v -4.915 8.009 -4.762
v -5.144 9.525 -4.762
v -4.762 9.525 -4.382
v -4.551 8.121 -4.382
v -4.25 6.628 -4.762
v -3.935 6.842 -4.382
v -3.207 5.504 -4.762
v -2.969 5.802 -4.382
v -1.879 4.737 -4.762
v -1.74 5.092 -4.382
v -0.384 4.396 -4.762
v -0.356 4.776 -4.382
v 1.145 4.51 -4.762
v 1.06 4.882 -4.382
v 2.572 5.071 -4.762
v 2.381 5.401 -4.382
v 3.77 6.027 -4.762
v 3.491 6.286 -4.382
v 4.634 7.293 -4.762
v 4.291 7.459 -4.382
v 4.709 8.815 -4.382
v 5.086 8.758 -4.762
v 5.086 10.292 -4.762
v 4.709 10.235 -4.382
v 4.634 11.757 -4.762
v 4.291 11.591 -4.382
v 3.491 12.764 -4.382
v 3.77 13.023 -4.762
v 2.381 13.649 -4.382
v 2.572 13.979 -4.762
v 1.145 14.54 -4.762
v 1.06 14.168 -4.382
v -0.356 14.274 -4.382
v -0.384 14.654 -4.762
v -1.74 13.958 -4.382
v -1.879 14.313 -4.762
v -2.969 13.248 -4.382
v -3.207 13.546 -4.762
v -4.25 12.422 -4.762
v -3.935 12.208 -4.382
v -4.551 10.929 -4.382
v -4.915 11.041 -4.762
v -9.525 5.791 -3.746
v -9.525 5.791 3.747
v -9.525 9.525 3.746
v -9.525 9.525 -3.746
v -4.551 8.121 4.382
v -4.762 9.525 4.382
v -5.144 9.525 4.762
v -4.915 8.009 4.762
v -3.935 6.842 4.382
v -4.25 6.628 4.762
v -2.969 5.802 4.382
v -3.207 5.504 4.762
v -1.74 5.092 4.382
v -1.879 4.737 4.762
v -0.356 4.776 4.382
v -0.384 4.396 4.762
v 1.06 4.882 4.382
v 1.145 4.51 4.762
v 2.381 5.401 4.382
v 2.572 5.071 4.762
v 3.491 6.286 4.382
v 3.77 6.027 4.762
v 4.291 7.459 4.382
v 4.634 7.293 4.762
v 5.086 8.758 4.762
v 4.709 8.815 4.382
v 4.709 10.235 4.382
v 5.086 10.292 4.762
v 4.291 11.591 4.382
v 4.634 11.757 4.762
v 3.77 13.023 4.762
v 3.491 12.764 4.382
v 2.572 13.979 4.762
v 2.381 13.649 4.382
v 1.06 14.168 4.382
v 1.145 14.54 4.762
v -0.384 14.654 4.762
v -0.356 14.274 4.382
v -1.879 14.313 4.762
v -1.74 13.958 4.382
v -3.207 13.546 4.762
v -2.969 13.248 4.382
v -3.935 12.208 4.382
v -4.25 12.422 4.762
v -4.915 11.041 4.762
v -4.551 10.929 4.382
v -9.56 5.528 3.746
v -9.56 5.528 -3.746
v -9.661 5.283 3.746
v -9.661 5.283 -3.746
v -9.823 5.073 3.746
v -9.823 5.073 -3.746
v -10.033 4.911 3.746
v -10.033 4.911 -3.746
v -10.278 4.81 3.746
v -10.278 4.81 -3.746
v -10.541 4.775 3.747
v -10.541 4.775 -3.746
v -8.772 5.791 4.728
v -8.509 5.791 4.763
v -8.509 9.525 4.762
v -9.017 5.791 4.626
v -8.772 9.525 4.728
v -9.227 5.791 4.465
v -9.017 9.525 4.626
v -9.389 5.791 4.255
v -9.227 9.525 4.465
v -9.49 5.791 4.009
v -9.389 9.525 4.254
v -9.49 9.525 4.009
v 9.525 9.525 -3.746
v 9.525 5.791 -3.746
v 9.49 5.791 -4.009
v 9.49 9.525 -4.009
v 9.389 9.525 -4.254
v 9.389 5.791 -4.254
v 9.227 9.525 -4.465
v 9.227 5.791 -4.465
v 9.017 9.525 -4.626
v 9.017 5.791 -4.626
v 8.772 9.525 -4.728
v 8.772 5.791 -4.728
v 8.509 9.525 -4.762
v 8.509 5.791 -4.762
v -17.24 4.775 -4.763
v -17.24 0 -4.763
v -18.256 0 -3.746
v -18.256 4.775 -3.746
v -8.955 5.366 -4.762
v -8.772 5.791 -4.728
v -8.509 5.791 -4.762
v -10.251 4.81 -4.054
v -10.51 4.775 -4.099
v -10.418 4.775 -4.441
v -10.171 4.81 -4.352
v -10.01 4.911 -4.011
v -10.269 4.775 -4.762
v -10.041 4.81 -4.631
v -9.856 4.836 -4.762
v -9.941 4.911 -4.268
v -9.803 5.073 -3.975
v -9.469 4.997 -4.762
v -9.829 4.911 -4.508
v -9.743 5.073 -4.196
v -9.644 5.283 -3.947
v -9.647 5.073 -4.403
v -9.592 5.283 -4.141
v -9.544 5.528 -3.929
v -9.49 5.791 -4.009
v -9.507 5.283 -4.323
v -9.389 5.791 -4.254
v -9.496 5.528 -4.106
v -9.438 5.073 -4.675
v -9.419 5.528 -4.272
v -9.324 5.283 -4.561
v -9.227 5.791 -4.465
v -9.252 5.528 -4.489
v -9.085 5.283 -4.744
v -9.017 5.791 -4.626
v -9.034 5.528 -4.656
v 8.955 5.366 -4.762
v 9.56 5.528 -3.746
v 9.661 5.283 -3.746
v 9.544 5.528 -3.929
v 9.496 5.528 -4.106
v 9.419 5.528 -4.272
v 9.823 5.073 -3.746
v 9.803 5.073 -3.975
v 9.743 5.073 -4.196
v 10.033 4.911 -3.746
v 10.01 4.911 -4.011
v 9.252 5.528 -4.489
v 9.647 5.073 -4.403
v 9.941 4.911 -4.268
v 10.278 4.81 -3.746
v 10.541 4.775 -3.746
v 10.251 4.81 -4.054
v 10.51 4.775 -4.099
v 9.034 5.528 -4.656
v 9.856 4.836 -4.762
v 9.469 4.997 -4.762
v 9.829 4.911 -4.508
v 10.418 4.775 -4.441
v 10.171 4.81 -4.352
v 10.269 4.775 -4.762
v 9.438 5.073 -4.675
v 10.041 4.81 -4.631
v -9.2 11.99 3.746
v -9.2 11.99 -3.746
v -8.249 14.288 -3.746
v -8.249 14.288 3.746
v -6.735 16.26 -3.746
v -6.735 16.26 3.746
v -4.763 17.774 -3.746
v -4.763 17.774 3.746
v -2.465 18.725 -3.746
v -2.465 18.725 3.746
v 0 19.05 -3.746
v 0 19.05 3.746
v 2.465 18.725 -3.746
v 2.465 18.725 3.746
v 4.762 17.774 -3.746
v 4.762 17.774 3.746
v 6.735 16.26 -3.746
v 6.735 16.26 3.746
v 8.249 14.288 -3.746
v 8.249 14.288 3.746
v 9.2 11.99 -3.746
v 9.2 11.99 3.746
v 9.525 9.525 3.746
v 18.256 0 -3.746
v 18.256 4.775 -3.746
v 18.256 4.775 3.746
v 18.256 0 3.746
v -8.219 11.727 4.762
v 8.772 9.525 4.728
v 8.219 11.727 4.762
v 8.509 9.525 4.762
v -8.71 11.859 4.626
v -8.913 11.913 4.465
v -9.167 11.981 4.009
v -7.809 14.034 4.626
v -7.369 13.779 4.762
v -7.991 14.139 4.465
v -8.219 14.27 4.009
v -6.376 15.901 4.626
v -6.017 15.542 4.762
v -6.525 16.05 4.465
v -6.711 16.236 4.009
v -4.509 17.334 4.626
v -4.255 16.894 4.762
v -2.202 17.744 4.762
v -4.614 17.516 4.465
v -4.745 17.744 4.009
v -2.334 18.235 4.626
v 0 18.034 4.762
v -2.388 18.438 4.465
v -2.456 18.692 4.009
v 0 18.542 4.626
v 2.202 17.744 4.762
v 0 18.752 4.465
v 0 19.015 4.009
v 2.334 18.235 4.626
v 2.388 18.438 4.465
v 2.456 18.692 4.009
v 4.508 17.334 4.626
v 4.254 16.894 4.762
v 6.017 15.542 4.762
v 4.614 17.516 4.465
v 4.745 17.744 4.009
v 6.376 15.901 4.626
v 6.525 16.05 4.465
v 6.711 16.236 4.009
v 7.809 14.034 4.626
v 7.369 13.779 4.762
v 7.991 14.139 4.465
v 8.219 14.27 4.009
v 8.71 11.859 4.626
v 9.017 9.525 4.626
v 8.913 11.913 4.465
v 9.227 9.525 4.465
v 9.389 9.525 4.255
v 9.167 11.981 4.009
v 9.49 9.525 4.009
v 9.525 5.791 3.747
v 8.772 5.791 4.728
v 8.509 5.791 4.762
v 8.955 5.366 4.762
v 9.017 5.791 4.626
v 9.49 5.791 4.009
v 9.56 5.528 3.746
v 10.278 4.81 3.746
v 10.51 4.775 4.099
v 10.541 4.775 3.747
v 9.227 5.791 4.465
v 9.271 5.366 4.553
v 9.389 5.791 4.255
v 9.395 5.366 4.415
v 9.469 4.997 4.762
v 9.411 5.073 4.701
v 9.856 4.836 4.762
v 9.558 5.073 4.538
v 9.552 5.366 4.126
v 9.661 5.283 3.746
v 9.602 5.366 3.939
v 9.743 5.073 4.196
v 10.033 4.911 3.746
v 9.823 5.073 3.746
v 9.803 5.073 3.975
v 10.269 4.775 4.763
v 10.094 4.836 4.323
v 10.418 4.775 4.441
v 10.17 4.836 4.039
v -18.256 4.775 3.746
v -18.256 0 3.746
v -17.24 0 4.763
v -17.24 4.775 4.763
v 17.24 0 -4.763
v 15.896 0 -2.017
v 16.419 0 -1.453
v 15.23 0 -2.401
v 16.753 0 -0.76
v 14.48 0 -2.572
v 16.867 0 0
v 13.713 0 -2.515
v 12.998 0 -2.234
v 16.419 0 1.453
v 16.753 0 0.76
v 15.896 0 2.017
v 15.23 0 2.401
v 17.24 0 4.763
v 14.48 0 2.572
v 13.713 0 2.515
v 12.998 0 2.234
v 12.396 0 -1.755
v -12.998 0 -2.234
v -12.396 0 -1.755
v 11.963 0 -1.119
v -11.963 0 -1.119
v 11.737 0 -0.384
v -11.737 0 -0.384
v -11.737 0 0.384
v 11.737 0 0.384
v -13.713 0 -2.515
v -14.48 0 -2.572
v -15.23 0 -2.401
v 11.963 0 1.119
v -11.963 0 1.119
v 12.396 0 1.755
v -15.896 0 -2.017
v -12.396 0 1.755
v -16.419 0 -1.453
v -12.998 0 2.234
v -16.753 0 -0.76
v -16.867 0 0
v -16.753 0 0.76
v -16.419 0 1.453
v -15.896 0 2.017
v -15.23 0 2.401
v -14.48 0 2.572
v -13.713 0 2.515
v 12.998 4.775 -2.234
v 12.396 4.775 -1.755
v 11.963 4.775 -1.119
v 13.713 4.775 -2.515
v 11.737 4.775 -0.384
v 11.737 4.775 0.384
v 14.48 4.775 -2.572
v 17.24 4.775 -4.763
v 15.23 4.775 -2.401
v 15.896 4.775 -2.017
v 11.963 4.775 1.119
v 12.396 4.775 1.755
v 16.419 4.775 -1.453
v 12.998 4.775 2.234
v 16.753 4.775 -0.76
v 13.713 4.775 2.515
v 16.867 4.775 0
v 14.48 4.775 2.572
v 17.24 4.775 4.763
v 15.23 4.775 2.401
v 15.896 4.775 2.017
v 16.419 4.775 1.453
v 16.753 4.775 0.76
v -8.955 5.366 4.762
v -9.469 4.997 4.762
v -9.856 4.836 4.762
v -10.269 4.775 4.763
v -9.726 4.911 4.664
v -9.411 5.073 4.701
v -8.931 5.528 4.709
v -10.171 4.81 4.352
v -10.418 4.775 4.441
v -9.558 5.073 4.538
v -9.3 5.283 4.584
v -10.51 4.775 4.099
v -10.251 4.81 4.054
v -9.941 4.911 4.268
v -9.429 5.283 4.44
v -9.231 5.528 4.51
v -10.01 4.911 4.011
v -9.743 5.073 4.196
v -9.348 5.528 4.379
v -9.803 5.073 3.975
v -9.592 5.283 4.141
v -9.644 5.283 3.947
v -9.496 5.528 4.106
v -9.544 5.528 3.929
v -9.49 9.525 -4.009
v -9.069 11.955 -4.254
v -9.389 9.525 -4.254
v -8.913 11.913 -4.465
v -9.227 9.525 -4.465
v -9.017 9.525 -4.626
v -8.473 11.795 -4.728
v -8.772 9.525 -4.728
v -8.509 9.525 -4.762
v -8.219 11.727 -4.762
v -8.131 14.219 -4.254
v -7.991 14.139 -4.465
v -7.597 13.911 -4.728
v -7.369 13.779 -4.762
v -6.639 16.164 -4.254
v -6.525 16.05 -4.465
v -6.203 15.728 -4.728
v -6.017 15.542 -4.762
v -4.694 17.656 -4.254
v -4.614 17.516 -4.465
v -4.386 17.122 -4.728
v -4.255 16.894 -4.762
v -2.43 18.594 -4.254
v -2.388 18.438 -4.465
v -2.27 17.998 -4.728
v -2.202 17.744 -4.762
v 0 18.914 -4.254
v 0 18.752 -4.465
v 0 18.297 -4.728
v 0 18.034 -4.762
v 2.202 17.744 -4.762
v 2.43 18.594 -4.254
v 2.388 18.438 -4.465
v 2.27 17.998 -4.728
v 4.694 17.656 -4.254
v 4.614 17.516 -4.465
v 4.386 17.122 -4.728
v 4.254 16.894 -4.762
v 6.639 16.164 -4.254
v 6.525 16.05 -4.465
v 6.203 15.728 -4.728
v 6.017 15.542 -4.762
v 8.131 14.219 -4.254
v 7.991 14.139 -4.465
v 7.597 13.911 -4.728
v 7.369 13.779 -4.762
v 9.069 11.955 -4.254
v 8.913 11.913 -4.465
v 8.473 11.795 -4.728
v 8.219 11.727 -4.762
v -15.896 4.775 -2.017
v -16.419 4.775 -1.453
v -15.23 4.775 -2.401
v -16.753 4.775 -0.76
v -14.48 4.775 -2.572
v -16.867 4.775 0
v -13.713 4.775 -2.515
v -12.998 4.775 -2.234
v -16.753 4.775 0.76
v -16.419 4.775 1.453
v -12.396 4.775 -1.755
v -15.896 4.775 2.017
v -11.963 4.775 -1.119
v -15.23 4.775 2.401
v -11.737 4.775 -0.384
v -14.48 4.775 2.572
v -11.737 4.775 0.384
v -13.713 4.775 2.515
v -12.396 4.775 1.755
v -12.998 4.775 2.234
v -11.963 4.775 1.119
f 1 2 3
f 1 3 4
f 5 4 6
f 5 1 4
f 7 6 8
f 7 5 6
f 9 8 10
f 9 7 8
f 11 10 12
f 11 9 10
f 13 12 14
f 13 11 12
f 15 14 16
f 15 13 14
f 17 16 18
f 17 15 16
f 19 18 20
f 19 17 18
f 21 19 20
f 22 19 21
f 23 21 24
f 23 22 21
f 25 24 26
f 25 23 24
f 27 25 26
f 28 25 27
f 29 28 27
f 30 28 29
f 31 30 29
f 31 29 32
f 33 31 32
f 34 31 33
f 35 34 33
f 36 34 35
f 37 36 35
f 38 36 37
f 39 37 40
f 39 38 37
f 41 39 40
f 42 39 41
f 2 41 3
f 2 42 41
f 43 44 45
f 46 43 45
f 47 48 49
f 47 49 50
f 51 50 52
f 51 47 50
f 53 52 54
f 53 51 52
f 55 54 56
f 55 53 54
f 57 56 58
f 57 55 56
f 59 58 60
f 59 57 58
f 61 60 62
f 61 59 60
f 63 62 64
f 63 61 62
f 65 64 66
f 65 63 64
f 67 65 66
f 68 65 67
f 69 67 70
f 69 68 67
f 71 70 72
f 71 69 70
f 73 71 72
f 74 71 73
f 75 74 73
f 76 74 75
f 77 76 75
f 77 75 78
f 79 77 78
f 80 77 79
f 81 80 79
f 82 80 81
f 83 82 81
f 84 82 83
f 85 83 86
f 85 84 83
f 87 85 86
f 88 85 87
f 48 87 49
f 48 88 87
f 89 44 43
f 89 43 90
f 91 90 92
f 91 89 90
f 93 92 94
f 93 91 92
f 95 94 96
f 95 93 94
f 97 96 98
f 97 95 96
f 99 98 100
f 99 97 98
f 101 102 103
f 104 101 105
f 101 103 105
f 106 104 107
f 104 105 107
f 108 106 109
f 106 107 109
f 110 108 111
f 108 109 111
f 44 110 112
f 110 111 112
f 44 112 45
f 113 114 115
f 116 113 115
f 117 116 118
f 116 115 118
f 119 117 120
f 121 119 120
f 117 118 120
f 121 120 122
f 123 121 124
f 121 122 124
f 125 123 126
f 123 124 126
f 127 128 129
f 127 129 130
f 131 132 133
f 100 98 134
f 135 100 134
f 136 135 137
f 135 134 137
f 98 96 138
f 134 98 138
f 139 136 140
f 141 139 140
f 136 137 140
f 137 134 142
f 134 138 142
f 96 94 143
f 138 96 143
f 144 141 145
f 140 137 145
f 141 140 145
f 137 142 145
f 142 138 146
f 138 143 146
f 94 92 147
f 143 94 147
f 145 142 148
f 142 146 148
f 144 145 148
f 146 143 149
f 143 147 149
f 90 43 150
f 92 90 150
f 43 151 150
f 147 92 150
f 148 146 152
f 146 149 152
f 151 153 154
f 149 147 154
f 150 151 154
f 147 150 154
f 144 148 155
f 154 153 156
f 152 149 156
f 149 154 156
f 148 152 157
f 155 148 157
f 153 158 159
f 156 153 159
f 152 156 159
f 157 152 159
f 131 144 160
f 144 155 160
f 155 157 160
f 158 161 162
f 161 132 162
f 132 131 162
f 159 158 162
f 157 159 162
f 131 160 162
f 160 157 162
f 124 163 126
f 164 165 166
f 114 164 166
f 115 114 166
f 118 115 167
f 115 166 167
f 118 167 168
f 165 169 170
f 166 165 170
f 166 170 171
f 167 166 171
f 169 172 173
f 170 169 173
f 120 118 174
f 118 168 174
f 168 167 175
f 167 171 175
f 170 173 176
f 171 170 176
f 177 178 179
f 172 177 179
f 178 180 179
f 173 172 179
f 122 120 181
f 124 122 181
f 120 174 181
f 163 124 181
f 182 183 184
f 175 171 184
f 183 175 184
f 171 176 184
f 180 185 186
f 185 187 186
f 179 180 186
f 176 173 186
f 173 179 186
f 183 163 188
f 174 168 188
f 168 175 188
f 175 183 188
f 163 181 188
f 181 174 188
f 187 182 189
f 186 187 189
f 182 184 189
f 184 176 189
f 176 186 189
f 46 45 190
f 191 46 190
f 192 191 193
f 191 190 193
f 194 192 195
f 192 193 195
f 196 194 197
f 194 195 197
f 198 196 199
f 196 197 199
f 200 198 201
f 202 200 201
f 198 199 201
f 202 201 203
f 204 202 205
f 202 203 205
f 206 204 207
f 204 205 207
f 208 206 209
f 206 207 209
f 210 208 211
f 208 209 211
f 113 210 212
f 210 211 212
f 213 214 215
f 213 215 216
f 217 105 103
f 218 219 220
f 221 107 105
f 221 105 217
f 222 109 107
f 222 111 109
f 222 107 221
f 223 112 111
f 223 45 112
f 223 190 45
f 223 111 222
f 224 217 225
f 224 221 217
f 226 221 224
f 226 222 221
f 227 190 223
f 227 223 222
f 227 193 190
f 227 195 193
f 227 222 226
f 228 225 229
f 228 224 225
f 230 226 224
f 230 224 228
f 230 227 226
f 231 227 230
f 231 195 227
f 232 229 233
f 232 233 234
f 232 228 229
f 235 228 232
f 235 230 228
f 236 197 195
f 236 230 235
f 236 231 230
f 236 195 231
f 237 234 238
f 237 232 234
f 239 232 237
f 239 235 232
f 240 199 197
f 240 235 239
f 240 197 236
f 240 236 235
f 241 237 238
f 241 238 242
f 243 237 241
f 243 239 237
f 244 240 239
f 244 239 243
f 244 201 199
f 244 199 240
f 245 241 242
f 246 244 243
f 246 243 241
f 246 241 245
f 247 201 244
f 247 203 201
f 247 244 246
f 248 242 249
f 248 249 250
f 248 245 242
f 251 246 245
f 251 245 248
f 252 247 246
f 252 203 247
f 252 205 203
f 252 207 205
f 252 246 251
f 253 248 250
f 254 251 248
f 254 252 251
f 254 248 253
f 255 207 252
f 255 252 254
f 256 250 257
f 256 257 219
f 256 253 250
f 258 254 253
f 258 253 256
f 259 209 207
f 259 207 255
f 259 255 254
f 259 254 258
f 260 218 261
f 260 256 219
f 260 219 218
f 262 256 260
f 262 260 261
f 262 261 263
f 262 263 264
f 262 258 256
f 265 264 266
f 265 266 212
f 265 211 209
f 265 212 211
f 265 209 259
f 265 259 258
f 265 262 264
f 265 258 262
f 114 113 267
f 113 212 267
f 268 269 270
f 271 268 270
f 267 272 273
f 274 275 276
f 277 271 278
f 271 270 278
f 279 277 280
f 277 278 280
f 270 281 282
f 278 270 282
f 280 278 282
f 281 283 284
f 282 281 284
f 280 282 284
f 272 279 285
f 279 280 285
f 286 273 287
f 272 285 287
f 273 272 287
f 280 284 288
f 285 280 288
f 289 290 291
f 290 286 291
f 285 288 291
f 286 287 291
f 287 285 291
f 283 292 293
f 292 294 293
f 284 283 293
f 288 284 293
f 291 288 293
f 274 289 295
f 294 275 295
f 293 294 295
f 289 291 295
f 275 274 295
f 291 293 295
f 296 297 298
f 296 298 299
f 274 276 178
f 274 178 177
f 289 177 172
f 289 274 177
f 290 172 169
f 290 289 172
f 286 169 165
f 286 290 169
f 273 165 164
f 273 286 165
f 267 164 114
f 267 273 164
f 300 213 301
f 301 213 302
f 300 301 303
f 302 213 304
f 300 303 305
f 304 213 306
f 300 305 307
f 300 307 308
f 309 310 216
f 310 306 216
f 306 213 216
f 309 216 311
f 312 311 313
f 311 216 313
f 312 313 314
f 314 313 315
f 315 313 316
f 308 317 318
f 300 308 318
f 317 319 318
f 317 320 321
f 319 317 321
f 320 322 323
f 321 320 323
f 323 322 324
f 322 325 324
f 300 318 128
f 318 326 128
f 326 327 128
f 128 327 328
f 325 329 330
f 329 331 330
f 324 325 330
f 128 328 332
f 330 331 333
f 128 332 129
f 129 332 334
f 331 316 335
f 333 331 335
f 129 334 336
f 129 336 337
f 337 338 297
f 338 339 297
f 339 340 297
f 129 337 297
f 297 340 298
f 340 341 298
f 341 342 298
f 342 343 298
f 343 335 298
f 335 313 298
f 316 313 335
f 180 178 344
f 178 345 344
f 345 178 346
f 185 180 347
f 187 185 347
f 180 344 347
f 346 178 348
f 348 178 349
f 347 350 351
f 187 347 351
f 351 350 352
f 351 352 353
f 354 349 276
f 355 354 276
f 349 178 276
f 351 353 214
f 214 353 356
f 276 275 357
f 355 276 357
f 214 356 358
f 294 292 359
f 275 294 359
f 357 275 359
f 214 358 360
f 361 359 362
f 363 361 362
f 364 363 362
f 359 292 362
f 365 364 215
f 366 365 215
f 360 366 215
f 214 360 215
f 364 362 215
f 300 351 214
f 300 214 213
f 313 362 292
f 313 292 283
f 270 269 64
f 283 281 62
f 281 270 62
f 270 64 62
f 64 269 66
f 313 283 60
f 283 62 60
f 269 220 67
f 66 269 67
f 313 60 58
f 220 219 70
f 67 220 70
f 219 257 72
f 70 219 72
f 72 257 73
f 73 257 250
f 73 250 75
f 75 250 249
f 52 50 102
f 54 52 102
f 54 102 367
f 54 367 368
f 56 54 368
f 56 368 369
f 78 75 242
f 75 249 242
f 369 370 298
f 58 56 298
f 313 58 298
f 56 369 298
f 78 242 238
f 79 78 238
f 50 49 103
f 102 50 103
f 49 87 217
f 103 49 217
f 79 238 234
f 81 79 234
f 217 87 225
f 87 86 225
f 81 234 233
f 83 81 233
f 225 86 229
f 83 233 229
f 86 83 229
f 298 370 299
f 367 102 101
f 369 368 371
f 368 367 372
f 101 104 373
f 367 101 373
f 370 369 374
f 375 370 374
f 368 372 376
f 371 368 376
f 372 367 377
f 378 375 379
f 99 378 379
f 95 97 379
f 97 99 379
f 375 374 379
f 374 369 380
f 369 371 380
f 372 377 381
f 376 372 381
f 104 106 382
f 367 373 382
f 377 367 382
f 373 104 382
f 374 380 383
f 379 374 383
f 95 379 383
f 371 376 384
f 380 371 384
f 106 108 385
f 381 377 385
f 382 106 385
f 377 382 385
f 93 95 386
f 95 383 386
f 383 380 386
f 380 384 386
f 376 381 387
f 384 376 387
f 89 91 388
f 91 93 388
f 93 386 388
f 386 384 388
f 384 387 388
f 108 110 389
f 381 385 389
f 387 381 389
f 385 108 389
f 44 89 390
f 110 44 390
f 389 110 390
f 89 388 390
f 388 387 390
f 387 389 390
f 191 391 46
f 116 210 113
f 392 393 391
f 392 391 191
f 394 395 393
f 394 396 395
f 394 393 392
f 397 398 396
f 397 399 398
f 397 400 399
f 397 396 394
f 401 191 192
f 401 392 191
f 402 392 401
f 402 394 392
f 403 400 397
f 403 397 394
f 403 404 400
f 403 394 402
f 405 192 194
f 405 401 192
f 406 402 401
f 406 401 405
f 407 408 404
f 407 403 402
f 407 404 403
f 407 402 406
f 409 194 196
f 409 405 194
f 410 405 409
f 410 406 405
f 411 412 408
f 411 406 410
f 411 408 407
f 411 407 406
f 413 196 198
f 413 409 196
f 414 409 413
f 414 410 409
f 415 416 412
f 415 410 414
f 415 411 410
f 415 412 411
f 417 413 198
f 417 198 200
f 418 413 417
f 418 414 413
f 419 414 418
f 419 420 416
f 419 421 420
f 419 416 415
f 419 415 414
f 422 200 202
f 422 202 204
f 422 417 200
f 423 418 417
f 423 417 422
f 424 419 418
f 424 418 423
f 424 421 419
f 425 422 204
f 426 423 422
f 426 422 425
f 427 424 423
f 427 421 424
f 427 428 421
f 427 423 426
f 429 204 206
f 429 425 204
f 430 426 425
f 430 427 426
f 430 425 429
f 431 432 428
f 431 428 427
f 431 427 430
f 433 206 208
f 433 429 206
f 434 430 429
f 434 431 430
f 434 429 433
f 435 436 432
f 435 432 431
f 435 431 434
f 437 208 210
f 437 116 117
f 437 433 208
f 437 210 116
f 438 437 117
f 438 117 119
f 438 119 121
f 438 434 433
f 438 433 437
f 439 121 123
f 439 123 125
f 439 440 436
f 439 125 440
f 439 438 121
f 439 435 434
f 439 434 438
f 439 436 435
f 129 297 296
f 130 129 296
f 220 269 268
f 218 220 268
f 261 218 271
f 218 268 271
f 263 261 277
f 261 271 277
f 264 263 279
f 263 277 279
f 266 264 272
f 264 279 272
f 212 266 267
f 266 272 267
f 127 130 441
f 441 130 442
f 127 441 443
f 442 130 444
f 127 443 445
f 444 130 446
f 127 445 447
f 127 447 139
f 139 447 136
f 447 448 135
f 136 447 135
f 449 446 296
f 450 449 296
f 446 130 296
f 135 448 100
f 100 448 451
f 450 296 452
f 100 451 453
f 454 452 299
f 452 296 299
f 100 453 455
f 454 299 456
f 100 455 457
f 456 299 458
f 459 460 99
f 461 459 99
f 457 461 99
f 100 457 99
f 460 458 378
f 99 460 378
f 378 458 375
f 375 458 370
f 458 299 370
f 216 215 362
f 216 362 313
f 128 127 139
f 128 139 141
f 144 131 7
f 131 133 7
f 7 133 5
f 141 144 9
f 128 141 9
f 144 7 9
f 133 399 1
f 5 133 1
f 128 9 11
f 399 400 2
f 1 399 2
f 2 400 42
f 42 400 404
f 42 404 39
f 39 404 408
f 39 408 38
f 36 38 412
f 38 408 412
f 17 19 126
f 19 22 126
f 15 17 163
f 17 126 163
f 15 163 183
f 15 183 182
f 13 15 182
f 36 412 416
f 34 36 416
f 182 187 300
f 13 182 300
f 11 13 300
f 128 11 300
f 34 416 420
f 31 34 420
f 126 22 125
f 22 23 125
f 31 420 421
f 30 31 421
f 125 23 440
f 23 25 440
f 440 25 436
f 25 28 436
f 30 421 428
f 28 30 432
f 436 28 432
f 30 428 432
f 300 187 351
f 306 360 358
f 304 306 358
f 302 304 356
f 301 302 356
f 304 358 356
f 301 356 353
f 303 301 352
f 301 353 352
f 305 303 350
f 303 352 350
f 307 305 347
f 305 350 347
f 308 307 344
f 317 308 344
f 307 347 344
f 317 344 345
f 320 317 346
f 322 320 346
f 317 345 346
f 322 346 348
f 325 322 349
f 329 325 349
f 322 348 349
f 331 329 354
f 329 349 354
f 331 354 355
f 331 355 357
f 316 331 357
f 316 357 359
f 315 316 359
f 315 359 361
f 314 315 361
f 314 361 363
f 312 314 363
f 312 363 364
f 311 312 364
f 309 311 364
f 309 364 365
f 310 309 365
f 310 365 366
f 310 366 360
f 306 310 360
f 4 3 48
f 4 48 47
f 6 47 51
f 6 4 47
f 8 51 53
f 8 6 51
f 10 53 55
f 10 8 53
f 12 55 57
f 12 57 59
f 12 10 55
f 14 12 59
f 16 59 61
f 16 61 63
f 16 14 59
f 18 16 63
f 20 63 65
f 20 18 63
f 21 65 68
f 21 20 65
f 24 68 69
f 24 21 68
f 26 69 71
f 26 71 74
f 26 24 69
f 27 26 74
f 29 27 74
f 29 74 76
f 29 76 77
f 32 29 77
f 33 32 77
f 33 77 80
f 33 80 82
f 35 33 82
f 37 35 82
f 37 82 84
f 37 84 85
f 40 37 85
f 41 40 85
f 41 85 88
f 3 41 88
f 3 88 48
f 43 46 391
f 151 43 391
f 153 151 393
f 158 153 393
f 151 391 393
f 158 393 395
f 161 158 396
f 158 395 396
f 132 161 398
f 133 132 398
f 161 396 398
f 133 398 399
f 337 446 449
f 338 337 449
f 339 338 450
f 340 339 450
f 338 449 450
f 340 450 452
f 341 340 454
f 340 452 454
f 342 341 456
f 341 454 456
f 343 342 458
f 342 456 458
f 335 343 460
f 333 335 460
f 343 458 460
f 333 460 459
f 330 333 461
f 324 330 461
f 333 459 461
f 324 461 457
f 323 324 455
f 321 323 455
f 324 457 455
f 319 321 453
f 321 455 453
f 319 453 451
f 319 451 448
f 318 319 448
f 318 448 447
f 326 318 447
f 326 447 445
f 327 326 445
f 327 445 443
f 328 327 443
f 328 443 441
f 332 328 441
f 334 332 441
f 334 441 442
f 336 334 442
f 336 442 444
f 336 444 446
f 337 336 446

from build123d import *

# Parameters (mm, degrees)
SKETCH2_R          = 4.7625
BODY_EXTRUDE_DEPTH = 4.7625
BODY_FILLET_A_R    = 1.016
BODY_FILLET_B_R    = 1.016
CHAMFER2_SIZE      = 1.016
ID_CHAMFER_SIZE    = 0.381
SKETCH3_R          = 2.5796875
HOLE_CUT_DEPTH     = 24.65886697


with BuildPart() as part:
    # Sketch2 → Body Extrude (new, symmetric)
    with BuildSketch(Plane.XY):
        with BuildLine():
            Line((-18.25625, 0), (-18.25625, 4.7752))
            Line((-18.25625, 4.7752), (-9.525, 4.7752))
            Line((-9.525, 4.7752), (-9.525, 9.525))
            ThreePointArc((-9.525, 9.525), (0, 19.05), (9.525, 9.525))
            Line((9.525, 9.525), (9.525, 4.7752))
            Line((9.525, 4.7752), (18.25625, 4.7752))
            Line((18.25625, 4.7752), (18.25625, 0))
            Line((18.25625, 0), (-18.25625, 0))
        make_face()
        with Locations(Location((0, 9.525, 0), (0, 0, 180))):
            Circle(SKETCH2_R, mode=Mode.SUBTRACT)
    extrude(amount=BODY_EXTRUDE_DEPTH, both=True)

    # Body Fillet A
    body_fillet_a_edges = [part.edges().sort_by_distance(p)[0] for p in [
        (9.525, 7.1501, 4.7625),
        (0, 19.05, 4.7625),
        (-9.525, 7.1501, 4.7625),
        (-9.525, 7.1501, -4.7625),
        (0, 19.05, -4.7625),
        (9.525, 7.1501, -4.7625),
    ]]
    fillet(body_fillet_a_edges, radius=BODY_FILLET_A_R)

    # Body Fillet B
    # the kernel refuses this fillet: 1.016 mm, written as the material it adds along each edge
    with BuildSketch(Plane(origin=(-9.525, 4.7752, 3.7465), x_dir=(0, 1, 0), z_dir=(0, 0, -1))) as body_fillet_b_piece_1:
        with BuildLine():
            CenterArc((BODY_FILLET_B_R, -BODY_FILLET_B_R), BODY_FILLET_B_R, 90, 90)
            Line((0, -BODY_FILLET_B_R), (0, 0))
            Line((0, 0), (BODY_FILLET_B_R, 0))
        make_face()
    extrude(amount=7.493)
    with BuildSketch(Plane(origin=(9.525, 4.7752, 3.7465), x_dir=(0, 1, 0), z_dir=(0, 0, -1))) as body_fillet_b_piece_2:
        with BuildLine():
            CenterArc((BODY_FILLET_B_R, BODY_FILLET_B_R), BODY_FILLET_B_R, 180, 90)
            Line((0, BODY_FILLET_B_R), (0, 0))
            Line((0, 0), (BODY_FILLET_B_R, 0))
        make_face()
    extrude(amount=7.493)
    with BuildSketch(Plane(origin=(-8.509, 4.7752, -3.7465), x_dir=(-1, 0, 0), z_dir=(0, 0, 1))) as body_fillet_b_piece_3_section:
        with BuildLine():
            CenterArc((1.016 + BODY_FILLET_B_R, -BODY_FILLET_B_R), BODY_FILLET_B_R, 90, 90)
            Line((1.016 + BODY_FILLET_B_R, 0), (1.016, 0))
            Line((1.016, 0), (1.016, -BODY_FILLET_B_R))
        make_face()
    body_fillet_b_piece_3 = revolve(axis=Axis((-8.509, 4.7752, -3.7465), (0, -1, 0)), revolution_arc=233.296989237, mode=Mode.PRIVATE)
    body_fillet_b_piece_3 = split(body_fillet_b_piece_3, bisect_by=Plane(origin=(-9.270938019, 5.091814151, -4.7625), z_dir=(0, 0, 1)), keep=Keep.TOP, mode=Mode.PRIVATE)
    add(body_fillet_b_piece_3)
    with BuildSketch(Plane(origin=(8.509, 4.7752, 3.7465), x_dir=(-0.5976672776328273, 0, -0.8017442392976483), z_dir=(0.8017442392976483, 0, -0.5976672776328273))) as body_fillet_b_piece_4_section:
        with BuildLine():
            CenterArc((1.016 + BODY_FILLET_B_R, BODY_FILLET_B_R), BODY_FILLET_B_R, 180, 90)
            Line((1.016, BODY_FILLET_B_R), (1.016, 0))
            Line((1.016, 0), (1.016 + BODY_FILLET_B_R, 0))
        make_face()
    body_fillet_b_piece_4 = revolve(axis=Axis((8.509, 4.7752, 3.7465), (0, 1, 0)), revolution_arc=233.296989237, mode=Mode.PRIVATE)
    body_fillet_b_piece_4 = split(body_fillet_b_piece_4, bisect_by=Plane(origin=(9.270937806, 5.091814769, 4.7625), z_dir=(0, 0, -1)), keep=Keep.TOP, mode=Mode.PRIVATE)
    add(body_fillet_b_piece_4)
    with BuildSketch(Plane(origin=(8.509, 4.7752, -3.7465), x_dir=(1, 0, 0), z_dir=(0, 0, 1))) as body_fillet_b_piece_5_section:
        with BuildLine():
            CenterArc((1.016 + BODY_FILLET_B_R, BODY_FILLET_B_R), BODY_FILLET_B_R, 180, 90)
            Line((1.016 + BODY_FILLET_B_R, 0), (1.016, 0))
            Line((1.016, 0), (1.016, BODY_FILLET_B_R))
        make_face()
    body_fillet_b_piece_5 = revolve(axis=Axis((8.509, 4.7752, -3.7465), (0, 1, 0)), revolution_arc=233.296989237, mode=Mode.PRIVATE)
    body_fillet_b_piece_5 = split(body_fillet_b_piece_5, bisect_by=Plane(origin=(9.270937903, 5.091814444, -4.7625), z_dir=(0, 0, 1)), keep=Keep.TOP, mode=Mode.PRIVATE)
    add(body_fillet_b_piece_5)
    with BuildSketch(Plane(origin=(-8.509, 4.7752, 3.7465), x_dir=(0.5976672776328271, 0, -0.8017442392976484), z_dir=(-0.8017442392976484, 0, -0.5976672776328271))) as body_fillet_b_piece_6_section:
        with BuildLine():
            CenterArc((1.016 + BODY_FILLET_B_R, -BODY_FILLET_B_R), BODY_FILLET_B_R, 90, 90)
            Line((1.016 + BODY_FILLET_B_R, 0), (1.016, 0))
            Line((1.016, 0), (1.016, -BODY_FILLET_B_R))
        make_face()
    body_fillet_b_piece_6 = revolve(axis=Axis((-8.509, 4.7752, 3.7465), (0, -1, 0)), revolution_arc=233.296989237, mode=Mode.PRIVATE)
    body_fillet_b_piece_6 = split(body_fillet_b_piece_6, bisect_by=Plane(origin=(-9.270937967, 5.09181436, 4.7625), z_dir=(0, 0, -1)), keep=Keep.TOP, mode=Mode.PRIVATE)
    add(body_fillet_b_piece_6)

    # Chamfer2
    chamfer2_edges = [part.edges().sort_by_distance(p)[0] for p in [
        (18.25625, 2.3876, -4.7625),
        (-18.25625, 2.3876, 4.7625),
        (18.25625, 2.3876, 4.7625),
        (-18.25625, 2.3876, -4.7625),
    ]]
    chamfer(chamfer2_edges, length=CHAMFER2_SIZE)

    # ID Chamfer
    id_chamfer_edges = [part.edges().sort_by_distance(p)[0] for p in [
        (4.7625, 9.525, -4.7625),
        (4.7625, 9.525, 4.7625),
    ]]
    chamfer(id_chamfer_edges, length=ID_CHAMFER_SIZE)

    # Sketch3 → Hole Cut (cut, through all)
    with BuildSketch(Plane(origin=(0, 4.7752, 0), x_dir=(1, 0, 0), z_dir=(0, 1, 0))):
        with Locations(Location((-14.2875, 0, 0), (0, 0, 180))):
            Circle(SKETCH3_R)
        with Locations((14.2875, 0)):
            Circle(SKETCH3_R)
    extrude(amount=-HOLE_CUT_DEPTH, mode=Mode.SUBTRACT)


solid = part.part
